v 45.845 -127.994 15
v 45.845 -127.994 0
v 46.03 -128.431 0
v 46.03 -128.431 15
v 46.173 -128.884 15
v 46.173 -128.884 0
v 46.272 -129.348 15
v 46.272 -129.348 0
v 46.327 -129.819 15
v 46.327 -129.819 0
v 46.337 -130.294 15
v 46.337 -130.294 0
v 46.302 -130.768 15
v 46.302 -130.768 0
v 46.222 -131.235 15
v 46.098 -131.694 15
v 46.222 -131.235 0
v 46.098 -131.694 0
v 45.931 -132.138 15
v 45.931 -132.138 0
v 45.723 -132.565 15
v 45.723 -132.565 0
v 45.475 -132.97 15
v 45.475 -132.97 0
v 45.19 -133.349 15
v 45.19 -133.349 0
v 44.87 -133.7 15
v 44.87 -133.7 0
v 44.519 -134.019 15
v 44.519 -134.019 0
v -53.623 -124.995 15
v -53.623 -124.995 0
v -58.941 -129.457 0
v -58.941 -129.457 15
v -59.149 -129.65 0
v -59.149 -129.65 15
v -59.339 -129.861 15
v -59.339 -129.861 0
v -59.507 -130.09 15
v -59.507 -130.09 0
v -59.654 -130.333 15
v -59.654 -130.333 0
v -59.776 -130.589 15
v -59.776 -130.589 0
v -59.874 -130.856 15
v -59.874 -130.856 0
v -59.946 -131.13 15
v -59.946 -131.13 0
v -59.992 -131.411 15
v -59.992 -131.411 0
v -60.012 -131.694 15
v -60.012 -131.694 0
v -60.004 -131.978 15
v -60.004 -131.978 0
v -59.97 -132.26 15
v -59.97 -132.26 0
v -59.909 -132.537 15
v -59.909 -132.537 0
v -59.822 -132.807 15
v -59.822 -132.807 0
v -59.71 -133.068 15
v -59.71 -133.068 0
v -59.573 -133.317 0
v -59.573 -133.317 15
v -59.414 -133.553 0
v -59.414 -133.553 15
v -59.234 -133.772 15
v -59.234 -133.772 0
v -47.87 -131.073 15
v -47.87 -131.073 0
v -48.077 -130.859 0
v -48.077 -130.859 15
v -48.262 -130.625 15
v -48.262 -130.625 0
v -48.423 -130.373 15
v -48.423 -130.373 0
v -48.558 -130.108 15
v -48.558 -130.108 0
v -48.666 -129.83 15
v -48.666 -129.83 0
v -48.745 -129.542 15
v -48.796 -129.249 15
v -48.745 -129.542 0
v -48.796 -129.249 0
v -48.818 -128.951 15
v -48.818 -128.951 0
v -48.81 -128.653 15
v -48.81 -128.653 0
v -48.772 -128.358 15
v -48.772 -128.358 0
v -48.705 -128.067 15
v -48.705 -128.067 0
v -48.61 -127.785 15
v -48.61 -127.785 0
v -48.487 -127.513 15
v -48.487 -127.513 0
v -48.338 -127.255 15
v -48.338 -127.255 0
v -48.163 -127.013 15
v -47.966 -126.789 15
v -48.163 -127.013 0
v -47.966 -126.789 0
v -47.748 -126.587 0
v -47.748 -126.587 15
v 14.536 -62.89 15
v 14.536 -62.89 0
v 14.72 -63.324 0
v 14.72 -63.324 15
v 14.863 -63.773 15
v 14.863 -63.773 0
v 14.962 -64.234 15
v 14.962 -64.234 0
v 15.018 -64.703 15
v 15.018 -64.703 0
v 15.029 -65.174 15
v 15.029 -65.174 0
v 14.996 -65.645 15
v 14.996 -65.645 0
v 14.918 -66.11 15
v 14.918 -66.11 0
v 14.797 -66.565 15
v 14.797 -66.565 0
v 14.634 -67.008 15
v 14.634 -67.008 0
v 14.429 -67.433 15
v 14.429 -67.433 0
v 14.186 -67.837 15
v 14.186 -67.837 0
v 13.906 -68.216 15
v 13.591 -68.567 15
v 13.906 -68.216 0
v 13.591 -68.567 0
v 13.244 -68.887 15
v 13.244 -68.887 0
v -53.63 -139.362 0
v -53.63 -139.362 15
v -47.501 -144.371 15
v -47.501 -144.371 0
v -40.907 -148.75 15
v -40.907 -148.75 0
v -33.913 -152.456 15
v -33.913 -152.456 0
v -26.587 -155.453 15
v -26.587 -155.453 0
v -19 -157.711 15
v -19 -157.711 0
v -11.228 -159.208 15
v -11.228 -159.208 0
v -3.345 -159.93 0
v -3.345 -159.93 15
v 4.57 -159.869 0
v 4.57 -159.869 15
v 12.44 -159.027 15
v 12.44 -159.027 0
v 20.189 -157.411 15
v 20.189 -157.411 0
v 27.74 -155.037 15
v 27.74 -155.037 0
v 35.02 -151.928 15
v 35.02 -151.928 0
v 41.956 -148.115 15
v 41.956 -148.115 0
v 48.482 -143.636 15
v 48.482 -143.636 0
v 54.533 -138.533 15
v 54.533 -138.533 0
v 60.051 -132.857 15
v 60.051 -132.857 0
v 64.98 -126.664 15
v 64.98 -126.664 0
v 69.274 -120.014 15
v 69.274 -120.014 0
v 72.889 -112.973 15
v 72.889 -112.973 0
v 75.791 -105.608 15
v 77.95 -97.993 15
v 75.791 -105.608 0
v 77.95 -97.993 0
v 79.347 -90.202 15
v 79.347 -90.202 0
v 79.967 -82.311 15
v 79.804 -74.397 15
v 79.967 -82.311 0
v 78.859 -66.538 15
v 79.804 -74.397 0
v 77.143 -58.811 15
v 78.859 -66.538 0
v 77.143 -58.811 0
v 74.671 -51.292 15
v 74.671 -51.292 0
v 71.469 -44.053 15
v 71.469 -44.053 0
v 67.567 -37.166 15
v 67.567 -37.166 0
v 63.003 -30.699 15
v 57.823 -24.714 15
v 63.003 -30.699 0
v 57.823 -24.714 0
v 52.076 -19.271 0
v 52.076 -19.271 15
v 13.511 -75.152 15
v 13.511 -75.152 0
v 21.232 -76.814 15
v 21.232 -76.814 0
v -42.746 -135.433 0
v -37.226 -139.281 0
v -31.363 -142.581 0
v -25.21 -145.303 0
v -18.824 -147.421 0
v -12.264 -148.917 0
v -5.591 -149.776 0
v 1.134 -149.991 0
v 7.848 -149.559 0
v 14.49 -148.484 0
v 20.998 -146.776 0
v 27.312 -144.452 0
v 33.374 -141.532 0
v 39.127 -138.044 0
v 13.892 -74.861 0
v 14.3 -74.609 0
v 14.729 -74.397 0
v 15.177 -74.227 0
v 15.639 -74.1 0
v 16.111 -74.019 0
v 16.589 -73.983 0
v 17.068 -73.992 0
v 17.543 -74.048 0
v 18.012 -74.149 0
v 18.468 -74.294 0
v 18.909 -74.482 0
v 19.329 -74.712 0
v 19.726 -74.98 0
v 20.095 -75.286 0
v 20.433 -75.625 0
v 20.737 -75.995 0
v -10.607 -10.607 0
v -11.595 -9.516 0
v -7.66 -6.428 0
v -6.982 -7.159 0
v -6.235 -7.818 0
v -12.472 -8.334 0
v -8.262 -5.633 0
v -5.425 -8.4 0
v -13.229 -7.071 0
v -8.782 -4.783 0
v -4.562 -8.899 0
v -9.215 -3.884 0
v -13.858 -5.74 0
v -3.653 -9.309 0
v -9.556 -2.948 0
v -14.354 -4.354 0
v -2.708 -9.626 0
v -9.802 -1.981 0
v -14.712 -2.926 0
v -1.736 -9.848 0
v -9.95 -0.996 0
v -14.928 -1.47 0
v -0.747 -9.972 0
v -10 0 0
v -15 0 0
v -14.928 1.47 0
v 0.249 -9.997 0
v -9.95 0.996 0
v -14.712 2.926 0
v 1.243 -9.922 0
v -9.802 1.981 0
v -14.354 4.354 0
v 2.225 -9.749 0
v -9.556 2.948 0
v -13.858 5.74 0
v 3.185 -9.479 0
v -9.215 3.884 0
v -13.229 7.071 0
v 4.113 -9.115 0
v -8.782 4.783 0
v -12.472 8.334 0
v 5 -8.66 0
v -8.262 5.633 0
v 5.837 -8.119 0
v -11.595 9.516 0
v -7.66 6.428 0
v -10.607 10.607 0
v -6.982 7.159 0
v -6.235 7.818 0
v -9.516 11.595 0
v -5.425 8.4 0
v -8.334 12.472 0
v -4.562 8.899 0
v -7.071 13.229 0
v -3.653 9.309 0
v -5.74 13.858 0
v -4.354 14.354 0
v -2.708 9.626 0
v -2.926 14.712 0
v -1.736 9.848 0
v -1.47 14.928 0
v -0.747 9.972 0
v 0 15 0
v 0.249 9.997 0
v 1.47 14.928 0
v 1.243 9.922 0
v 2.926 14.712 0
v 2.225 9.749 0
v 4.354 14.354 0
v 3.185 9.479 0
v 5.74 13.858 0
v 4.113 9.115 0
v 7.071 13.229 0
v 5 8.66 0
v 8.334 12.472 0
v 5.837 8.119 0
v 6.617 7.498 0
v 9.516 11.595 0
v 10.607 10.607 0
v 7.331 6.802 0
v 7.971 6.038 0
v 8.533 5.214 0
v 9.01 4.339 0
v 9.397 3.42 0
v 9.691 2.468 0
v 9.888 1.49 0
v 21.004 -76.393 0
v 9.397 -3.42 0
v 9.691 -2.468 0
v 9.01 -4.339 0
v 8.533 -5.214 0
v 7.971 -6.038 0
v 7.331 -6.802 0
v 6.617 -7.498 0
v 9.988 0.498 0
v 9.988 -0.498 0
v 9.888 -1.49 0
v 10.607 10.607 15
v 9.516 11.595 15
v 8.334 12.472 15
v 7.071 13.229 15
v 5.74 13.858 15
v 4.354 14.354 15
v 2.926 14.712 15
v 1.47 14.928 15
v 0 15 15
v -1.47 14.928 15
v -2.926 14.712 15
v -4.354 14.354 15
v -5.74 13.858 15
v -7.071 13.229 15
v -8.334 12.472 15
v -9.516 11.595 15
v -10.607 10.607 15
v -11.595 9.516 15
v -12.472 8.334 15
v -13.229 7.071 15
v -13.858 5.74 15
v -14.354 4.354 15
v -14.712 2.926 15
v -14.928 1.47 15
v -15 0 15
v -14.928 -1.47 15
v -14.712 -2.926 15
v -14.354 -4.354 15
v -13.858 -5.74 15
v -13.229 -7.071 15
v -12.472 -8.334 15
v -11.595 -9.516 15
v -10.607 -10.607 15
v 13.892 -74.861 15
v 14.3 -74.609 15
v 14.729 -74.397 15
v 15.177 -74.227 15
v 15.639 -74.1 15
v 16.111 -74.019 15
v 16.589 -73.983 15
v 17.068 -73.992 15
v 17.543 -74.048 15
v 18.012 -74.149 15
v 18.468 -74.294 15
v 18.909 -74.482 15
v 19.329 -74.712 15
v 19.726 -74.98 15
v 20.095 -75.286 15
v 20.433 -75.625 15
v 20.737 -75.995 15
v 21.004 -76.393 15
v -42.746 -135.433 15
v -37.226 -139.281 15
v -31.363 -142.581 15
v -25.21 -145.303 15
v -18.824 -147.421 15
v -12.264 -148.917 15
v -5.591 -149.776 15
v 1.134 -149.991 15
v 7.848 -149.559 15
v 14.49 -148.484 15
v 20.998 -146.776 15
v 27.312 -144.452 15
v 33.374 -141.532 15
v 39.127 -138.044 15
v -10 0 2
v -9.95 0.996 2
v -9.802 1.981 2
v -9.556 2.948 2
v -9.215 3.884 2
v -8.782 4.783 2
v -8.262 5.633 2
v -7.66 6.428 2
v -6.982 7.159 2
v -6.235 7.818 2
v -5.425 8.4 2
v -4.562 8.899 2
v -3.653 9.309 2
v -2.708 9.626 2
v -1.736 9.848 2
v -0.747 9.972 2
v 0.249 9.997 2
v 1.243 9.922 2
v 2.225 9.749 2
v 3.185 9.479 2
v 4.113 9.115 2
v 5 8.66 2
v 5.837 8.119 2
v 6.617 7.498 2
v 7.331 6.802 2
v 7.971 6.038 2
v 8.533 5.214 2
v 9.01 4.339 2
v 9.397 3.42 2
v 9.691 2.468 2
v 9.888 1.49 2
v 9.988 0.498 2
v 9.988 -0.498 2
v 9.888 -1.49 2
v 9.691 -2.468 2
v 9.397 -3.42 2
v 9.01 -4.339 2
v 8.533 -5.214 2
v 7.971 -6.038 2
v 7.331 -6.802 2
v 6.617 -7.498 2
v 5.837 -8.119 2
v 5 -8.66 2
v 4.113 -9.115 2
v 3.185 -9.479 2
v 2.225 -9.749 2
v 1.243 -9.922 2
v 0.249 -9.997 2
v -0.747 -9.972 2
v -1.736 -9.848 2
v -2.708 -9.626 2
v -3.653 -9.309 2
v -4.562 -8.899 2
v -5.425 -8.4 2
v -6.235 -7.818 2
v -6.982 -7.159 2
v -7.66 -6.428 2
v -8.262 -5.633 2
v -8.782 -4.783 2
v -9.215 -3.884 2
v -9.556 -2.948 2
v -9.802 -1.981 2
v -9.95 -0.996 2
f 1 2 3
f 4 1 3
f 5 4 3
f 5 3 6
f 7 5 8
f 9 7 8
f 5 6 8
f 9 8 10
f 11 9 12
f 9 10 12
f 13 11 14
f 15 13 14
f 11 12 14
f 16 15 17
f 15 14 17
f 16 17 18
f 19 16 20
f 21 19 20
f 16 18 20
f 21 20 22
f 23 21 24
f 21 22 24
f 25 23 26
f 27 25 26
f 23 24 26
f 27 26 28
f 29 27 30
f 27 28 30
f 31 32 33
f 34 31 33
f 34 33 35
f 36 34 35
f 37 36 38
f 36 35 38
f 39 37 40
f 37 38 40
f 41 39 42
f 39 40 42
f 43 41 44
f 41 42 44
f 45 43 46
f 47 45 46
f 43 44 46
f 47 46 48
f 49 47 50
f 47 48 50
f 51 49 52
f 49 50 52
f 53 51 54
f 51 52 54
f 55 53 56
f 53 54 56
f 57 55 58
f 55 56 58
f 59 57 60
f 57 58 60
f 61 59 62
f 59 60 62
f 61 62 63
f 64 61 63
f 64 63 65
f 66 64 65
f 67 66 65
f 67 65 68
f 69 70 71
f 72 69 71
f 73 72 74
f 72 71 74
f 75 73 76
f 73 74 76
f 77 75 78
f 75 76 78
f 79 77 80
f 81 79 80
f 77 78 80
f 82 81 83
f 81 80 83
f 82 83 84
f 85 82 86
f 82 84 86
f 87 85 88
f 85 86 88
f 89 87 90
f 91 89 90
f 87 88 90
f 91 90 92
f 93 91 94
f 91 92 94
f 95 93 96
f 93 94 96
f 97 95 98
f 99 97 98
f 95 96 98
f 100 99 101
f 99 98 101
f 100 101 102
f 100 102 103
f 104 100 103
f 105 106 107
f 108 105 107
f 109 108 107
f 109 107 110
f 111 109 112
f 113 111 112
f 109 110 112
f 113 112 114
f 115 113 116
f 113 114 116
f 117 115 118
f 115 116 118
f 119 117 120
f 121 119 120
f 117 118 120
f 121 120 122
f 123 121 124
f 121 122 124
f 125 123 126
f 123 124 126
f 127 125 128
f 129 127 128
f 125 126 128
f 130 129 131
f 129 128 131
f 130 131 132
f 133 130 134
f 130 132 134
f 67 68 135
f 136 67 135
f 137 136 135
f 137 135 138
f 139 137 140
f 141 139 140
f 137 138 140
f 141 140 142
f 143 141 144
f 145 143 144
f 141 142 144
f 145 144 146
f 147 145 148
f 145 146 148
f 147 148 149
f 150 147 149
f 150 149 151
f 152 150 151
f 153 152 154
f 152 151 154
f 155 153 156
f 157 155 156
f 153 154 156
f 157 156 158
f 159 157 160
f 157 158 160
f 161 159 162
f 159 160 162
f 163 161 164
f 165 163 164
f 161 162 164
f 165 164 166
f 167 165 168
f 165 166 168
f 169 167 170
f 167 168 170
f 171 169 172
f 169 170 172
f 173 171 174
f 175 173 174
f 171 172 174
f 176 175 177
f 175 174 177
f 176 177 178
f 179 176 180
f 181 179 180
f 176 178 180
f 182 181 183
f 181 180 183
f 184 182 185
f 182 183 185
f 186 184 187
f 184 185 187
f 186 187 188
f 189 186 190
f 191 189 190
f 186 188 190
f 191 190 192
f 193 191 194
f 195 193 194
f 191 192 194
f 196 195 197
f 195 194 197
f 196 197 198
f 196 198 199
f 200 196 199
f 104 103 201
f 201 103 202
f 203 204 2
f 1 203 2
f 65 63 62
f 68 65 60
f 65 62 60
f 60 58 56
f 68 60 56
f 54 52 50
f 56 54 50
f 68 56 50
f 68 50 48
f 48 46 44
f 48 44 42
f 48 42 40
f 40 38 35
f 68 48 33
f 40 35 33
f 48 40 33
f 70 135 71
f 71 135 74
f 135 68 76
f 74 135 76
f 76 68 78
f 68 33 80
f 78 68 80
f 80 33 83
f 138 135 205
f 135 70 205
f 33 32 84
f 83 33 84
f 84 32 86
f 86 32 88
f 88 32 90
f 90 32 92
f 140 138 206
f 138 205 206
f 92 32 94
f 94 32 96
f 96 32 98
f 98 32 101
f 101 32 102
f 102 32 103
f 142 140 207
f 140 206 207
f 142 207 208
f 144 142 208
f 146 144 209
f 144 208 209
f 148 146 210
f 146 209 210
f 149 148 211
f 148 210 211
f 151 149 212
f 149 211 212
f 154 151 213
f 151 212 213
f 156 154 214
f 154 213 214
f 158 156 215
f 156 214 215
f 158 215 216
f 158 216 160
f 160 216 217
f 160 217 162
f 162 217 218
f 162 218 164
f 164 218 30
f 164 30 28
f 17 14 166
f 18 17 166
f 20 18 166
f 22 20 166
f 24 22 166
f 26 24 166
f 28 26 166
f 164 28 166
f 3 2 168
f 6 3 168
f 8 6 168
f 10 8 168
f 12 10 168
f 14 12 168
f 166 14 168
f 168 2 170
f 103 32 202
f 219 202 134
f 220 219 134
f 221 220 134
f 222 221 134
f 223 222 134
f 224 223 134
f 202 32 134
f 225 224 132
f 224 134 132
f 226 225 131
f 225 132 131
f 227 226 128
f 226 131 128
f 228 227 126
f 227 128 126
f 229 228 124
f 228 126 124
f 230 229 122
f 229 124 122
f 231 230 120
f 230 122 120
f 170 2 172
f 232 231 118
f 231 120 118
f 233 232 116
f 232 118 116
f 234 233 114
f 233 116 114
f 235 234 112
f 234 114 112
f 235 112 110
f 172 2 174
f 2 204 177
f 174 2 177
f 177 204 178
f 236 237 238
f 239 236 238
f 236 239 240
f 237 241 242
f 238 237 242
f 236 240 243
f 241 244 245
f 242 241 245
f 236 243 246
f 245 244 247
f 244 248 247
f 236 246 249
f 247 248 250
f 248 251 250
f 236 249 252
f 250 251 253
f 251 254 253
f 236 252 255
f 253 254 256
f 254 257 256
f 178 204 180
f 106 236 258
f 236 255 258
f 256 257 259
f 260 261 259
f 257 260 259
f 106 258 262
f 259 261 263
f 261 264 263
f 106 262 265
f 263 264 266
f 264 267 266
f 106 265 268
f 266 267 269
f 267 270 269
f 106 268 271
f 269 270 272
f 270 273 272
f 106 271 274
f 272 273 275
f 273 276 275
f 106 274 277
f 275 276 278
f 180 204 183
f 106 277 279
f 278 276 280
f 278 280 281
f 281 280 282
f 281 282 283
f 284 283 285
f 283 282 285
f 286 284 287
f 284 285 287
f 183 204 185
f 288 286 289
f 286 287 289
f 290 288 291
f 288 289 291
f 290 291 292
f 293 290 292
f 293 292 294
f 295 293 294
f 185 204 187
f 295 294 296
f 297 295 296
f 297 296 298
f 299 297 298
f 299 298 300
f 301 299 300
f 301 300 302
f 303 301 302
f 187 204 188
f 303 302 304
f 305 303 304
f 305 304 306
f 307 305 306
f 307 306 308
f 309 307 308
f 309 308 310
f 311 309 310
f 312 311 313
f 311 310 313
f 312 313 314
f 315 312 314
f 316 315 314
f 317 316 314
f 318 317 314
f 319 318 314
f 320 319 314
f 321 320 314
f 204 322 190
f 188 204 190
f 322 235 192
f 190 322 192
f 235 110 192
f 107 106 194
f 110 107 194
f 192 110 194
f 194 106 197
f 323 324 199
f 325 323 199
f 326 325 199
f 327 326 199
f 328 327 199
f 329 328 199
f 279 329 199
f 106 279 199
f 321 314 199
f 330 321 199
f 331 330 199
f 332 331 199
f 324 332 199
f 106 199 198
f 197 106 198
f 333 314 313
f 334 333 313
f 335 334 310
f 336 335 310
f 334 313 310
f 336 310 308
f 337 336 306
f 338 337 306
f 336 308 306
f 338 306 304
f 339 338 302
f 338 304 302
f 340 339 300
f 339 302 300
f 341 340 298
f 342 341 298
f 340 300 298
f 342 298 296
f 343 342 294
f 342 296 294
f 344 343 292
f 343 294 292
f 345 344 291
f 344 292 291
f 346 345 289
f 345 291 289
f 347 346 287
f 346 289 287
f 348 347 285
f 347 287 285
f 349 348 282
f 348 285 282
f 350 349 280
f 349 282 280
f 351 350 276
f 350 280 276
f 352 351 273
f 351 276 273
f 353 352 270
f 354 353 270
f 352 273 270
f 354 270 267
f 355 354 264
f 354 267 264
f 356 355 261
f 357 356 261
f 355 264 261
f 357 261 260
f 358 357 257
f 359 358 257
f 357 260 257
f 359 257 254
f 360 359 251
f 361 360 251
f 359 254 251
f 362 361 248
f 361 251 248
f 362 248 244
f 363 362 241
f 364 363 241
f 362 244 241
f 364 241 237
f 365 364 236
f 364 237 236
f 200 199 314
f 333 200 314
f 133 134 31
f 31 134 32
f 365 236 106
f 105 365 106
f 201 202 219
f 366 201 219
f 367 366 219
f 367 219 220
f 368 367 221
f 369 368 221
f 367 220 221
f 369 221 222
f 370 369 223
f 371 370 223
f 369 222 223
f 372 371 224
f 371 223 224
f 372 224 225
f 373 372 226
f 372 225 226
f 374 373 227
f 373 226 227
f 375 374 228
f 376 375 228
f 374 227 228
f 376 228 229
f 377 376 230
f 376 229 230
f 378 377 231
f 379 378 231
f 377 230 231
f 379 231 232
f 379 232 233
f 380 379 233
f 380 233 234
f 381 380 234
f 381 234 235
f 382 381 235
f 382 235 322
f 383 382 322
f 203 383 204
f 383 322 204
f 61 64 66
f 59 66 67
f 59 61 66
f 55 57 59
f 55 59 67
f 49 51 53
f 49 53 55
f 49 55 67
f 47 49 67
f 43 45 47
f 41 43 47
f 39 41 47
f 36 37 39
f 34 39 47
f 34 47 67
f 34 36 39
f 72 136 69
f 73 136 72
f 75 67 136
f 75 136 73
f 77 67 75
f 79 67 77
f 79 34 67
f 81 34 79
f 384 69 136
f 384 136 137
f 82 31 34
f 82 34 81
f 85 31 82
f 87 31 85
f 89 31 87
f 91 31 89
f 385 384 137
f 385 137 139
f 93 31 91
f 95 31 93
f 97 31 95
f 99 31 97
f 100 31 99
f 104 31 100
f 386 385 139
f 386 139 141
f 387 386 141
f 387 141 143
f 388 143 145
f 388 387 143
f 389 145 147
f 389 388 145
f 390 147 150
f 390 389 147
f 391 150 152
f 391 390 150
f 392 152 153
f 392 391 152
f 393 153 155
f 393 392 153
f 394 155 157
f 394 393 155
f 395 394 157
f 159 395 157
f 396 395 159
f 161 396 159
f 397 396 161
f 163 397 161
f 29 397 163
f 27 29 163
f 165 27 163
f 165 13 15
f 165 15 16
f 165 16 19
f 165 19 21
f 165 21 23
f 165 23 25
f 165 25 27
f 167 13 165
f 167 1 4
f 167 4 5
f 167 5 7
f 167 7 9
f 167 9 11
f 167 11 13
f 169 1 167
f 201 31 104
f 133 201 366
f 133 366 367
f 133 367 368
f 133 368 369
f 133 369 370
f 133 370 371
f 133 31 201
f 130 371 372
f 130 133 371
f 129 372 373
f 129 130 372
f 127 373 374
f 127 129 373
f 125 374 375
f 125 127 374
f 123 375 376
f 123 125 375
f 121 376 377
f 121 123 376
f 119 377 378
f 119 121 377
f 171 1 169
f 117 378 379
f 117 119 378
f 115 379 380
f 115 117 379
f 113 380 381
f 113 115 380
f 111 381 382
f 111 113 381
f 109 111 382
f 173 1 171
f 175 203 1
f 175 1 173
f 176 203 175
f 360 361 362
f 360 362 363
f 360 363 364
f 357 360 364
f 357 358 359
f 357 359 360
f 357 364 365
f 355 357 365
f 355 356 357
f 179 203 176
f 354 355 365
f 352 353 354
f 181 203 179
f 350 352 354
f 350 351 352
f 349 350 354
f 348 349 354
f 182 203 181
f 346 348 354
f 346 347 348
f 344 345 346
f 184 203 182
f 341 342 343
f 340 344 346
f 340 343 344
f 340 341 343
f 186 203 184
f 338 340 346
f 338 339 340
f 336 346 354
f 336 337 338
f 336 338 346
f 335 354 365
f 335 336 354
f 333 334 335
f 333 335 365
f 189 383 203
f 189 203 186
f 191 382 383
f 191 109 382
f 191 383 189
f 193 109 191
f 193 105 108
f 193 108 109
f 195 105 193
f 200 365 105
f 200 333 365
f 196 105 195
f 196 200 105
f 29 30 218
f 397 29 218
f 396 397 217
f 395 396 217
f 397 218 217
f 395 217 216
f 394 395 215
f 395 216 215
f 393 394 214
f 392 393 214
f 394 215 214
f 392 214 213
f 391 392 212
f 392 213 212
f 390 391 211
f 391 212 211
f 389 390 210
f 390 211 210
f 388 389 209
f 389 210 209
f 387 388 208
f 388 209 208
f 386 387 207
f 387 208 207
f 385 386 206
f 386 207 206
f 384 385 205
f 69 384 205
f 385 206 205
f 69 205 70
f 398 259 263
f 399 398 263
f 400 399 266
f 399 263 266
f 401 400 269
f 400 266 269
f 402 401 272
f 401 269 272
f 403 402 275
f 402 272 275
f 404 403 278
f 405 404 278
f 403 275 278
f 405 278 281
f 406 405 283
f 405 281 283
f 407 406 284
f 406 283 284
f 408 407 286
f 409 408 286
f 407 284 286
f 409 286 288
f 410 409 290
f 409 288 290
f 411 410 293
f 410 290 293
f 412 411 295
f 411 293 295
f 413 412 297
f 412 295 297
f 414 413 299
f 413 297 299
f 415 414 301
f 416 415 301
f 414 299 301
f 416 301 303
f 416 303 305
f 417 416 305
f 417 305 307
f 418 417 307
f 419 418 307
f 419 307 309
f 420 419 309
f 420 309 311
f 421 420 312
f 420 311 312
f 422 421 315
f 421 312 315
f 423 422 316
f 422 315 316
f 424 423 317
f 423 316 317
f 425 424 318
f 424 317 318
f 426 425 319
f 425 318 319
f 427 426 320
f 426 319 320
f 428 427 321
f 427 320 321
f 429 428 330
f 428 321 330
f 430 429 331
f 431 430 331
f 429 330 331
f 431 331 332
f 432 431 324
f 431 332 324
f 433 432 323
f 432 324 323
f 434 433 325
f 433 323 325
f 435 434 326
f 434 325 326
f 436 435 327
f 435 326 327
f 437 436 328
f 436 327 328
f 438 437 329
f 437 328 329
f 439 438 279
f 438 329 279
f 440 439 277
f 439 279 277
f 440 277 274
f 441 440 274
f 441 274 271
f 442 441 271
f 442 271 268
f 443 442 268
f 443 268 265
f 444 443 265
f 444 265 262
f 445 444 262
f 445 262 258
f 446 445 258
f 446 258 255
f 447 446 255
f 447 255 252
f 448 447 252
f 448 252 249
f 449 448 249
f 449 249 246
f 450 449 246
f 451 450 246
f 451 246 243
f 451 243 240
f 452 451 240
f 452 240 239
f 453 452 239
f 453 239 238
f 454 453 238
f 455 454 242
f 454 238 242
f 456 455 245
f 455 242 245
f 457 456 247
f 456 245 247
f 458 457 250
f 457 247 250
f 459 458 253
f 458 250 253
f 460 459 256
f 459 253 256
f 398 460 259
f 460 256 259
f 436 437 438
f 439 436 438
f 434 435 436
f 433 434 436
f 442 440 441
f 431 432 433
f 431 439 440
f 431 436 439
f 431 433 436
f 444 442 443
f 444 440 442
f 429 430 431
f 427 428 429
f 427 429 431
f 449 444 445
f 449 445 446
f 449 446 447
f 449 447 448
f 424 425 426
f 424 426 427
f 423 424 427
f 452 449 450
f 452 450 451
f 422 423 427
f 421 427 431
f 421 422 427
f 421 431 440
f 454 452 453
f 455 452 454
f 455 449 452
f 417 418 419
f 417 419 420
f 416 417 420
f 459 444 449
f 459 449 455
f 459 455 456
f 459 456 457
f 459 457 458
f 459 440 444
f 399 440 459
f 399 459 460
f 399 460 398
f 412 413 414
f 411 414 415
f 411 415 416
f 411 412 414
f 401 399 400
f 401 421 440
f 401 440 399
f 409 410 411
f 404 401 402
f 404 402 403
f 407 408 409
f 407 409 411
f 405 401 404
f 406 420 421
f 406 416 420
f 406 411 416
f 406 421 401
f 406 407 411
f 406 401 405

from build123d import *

# Parameters (mm, degrees)
EXTRUDE_1_DEPTH     = 15
SKETCH_9_R          = 10
CUT_EXTRUDE_3_DEPTH = 2


with BuildPart() as part:
    # ｽｹｯﾁ4 → ﾎﾞｽ - 押し出し1 (new body)
    with BuildSketch(Plane.XY):
        with BuildLine():
            Line((-53.623111018, -124.995132678), (-58.940636287, -129.45706617))
            ThreePointArc((-58.940636287, -129.45706617), (-60.005384698, -131.552012131), (-59.233530865, -133.771635843))
            ThreePointArc((-59.233530865, -133.771635843), (57.362306223, -135.763481103), (52.076178918, -19.270504783))
            Line((52.076178918, -19.270504783), (10.606601718, 10.606601718))
            ThreePointArc((10.606601718, 10.606601718), (-10.606601718, 10.606601718), (-10.606601718, -10.606601718))
            Line((-10.606601718, -10.606601718), (14.536280154, -62.889638219))
            ThreePointArc((14.536280154, -62.889638219), (14.918089499, -66.109676181), (13.244185189, -68.886809092))
            Line((13.244185189, -68.886809092), (-53.623111018, -124.995132678))
        make_face()
        with BuildLine():
            Line((21.232400696, -76.813798404), (45.844843506, -127.993820346))
            ThreePointArc((45.844843506, -127.993820346), (46.221944165, -131.235480845), (44.518718993, -134.019289696))
            ThreePointArc((44.518718993, -134.019289696), (-2.231208213, -149.964431749), (-47.870174388, -131.072951785))
            ThreePointArc((-47.870174388, -131.072951785), (-48.817477846, -128.802229421), (-47.747678417, -126.586582094))
            Line((-47.747678417, -126.586582094), (13.511229465, -75.151532228))
            ThreePointArc((13.511229465, -75.151532228), (17.77869109, -74.092739753), (21.232400696, -76.813798404))
        make_face(mode=Mode.SUBTRACT)
    extrude(amount=EXTRUDE_1_DEPTH)

    # ｽｹｯﾁ9 → ｶｯﾄ - 押し出し3 (cut)
    with BuildSketch(Plane(origin=(0, 0, 0), x_dir=(-1, 0, 0), z_dir=(0, 0, -1))):
        Circle(SKETCH_9_R)
    extrude(amount=-CUT_EXTRUDE_3_DEPTH, mode=Mode.SUBTRACT)


solid = part.part
